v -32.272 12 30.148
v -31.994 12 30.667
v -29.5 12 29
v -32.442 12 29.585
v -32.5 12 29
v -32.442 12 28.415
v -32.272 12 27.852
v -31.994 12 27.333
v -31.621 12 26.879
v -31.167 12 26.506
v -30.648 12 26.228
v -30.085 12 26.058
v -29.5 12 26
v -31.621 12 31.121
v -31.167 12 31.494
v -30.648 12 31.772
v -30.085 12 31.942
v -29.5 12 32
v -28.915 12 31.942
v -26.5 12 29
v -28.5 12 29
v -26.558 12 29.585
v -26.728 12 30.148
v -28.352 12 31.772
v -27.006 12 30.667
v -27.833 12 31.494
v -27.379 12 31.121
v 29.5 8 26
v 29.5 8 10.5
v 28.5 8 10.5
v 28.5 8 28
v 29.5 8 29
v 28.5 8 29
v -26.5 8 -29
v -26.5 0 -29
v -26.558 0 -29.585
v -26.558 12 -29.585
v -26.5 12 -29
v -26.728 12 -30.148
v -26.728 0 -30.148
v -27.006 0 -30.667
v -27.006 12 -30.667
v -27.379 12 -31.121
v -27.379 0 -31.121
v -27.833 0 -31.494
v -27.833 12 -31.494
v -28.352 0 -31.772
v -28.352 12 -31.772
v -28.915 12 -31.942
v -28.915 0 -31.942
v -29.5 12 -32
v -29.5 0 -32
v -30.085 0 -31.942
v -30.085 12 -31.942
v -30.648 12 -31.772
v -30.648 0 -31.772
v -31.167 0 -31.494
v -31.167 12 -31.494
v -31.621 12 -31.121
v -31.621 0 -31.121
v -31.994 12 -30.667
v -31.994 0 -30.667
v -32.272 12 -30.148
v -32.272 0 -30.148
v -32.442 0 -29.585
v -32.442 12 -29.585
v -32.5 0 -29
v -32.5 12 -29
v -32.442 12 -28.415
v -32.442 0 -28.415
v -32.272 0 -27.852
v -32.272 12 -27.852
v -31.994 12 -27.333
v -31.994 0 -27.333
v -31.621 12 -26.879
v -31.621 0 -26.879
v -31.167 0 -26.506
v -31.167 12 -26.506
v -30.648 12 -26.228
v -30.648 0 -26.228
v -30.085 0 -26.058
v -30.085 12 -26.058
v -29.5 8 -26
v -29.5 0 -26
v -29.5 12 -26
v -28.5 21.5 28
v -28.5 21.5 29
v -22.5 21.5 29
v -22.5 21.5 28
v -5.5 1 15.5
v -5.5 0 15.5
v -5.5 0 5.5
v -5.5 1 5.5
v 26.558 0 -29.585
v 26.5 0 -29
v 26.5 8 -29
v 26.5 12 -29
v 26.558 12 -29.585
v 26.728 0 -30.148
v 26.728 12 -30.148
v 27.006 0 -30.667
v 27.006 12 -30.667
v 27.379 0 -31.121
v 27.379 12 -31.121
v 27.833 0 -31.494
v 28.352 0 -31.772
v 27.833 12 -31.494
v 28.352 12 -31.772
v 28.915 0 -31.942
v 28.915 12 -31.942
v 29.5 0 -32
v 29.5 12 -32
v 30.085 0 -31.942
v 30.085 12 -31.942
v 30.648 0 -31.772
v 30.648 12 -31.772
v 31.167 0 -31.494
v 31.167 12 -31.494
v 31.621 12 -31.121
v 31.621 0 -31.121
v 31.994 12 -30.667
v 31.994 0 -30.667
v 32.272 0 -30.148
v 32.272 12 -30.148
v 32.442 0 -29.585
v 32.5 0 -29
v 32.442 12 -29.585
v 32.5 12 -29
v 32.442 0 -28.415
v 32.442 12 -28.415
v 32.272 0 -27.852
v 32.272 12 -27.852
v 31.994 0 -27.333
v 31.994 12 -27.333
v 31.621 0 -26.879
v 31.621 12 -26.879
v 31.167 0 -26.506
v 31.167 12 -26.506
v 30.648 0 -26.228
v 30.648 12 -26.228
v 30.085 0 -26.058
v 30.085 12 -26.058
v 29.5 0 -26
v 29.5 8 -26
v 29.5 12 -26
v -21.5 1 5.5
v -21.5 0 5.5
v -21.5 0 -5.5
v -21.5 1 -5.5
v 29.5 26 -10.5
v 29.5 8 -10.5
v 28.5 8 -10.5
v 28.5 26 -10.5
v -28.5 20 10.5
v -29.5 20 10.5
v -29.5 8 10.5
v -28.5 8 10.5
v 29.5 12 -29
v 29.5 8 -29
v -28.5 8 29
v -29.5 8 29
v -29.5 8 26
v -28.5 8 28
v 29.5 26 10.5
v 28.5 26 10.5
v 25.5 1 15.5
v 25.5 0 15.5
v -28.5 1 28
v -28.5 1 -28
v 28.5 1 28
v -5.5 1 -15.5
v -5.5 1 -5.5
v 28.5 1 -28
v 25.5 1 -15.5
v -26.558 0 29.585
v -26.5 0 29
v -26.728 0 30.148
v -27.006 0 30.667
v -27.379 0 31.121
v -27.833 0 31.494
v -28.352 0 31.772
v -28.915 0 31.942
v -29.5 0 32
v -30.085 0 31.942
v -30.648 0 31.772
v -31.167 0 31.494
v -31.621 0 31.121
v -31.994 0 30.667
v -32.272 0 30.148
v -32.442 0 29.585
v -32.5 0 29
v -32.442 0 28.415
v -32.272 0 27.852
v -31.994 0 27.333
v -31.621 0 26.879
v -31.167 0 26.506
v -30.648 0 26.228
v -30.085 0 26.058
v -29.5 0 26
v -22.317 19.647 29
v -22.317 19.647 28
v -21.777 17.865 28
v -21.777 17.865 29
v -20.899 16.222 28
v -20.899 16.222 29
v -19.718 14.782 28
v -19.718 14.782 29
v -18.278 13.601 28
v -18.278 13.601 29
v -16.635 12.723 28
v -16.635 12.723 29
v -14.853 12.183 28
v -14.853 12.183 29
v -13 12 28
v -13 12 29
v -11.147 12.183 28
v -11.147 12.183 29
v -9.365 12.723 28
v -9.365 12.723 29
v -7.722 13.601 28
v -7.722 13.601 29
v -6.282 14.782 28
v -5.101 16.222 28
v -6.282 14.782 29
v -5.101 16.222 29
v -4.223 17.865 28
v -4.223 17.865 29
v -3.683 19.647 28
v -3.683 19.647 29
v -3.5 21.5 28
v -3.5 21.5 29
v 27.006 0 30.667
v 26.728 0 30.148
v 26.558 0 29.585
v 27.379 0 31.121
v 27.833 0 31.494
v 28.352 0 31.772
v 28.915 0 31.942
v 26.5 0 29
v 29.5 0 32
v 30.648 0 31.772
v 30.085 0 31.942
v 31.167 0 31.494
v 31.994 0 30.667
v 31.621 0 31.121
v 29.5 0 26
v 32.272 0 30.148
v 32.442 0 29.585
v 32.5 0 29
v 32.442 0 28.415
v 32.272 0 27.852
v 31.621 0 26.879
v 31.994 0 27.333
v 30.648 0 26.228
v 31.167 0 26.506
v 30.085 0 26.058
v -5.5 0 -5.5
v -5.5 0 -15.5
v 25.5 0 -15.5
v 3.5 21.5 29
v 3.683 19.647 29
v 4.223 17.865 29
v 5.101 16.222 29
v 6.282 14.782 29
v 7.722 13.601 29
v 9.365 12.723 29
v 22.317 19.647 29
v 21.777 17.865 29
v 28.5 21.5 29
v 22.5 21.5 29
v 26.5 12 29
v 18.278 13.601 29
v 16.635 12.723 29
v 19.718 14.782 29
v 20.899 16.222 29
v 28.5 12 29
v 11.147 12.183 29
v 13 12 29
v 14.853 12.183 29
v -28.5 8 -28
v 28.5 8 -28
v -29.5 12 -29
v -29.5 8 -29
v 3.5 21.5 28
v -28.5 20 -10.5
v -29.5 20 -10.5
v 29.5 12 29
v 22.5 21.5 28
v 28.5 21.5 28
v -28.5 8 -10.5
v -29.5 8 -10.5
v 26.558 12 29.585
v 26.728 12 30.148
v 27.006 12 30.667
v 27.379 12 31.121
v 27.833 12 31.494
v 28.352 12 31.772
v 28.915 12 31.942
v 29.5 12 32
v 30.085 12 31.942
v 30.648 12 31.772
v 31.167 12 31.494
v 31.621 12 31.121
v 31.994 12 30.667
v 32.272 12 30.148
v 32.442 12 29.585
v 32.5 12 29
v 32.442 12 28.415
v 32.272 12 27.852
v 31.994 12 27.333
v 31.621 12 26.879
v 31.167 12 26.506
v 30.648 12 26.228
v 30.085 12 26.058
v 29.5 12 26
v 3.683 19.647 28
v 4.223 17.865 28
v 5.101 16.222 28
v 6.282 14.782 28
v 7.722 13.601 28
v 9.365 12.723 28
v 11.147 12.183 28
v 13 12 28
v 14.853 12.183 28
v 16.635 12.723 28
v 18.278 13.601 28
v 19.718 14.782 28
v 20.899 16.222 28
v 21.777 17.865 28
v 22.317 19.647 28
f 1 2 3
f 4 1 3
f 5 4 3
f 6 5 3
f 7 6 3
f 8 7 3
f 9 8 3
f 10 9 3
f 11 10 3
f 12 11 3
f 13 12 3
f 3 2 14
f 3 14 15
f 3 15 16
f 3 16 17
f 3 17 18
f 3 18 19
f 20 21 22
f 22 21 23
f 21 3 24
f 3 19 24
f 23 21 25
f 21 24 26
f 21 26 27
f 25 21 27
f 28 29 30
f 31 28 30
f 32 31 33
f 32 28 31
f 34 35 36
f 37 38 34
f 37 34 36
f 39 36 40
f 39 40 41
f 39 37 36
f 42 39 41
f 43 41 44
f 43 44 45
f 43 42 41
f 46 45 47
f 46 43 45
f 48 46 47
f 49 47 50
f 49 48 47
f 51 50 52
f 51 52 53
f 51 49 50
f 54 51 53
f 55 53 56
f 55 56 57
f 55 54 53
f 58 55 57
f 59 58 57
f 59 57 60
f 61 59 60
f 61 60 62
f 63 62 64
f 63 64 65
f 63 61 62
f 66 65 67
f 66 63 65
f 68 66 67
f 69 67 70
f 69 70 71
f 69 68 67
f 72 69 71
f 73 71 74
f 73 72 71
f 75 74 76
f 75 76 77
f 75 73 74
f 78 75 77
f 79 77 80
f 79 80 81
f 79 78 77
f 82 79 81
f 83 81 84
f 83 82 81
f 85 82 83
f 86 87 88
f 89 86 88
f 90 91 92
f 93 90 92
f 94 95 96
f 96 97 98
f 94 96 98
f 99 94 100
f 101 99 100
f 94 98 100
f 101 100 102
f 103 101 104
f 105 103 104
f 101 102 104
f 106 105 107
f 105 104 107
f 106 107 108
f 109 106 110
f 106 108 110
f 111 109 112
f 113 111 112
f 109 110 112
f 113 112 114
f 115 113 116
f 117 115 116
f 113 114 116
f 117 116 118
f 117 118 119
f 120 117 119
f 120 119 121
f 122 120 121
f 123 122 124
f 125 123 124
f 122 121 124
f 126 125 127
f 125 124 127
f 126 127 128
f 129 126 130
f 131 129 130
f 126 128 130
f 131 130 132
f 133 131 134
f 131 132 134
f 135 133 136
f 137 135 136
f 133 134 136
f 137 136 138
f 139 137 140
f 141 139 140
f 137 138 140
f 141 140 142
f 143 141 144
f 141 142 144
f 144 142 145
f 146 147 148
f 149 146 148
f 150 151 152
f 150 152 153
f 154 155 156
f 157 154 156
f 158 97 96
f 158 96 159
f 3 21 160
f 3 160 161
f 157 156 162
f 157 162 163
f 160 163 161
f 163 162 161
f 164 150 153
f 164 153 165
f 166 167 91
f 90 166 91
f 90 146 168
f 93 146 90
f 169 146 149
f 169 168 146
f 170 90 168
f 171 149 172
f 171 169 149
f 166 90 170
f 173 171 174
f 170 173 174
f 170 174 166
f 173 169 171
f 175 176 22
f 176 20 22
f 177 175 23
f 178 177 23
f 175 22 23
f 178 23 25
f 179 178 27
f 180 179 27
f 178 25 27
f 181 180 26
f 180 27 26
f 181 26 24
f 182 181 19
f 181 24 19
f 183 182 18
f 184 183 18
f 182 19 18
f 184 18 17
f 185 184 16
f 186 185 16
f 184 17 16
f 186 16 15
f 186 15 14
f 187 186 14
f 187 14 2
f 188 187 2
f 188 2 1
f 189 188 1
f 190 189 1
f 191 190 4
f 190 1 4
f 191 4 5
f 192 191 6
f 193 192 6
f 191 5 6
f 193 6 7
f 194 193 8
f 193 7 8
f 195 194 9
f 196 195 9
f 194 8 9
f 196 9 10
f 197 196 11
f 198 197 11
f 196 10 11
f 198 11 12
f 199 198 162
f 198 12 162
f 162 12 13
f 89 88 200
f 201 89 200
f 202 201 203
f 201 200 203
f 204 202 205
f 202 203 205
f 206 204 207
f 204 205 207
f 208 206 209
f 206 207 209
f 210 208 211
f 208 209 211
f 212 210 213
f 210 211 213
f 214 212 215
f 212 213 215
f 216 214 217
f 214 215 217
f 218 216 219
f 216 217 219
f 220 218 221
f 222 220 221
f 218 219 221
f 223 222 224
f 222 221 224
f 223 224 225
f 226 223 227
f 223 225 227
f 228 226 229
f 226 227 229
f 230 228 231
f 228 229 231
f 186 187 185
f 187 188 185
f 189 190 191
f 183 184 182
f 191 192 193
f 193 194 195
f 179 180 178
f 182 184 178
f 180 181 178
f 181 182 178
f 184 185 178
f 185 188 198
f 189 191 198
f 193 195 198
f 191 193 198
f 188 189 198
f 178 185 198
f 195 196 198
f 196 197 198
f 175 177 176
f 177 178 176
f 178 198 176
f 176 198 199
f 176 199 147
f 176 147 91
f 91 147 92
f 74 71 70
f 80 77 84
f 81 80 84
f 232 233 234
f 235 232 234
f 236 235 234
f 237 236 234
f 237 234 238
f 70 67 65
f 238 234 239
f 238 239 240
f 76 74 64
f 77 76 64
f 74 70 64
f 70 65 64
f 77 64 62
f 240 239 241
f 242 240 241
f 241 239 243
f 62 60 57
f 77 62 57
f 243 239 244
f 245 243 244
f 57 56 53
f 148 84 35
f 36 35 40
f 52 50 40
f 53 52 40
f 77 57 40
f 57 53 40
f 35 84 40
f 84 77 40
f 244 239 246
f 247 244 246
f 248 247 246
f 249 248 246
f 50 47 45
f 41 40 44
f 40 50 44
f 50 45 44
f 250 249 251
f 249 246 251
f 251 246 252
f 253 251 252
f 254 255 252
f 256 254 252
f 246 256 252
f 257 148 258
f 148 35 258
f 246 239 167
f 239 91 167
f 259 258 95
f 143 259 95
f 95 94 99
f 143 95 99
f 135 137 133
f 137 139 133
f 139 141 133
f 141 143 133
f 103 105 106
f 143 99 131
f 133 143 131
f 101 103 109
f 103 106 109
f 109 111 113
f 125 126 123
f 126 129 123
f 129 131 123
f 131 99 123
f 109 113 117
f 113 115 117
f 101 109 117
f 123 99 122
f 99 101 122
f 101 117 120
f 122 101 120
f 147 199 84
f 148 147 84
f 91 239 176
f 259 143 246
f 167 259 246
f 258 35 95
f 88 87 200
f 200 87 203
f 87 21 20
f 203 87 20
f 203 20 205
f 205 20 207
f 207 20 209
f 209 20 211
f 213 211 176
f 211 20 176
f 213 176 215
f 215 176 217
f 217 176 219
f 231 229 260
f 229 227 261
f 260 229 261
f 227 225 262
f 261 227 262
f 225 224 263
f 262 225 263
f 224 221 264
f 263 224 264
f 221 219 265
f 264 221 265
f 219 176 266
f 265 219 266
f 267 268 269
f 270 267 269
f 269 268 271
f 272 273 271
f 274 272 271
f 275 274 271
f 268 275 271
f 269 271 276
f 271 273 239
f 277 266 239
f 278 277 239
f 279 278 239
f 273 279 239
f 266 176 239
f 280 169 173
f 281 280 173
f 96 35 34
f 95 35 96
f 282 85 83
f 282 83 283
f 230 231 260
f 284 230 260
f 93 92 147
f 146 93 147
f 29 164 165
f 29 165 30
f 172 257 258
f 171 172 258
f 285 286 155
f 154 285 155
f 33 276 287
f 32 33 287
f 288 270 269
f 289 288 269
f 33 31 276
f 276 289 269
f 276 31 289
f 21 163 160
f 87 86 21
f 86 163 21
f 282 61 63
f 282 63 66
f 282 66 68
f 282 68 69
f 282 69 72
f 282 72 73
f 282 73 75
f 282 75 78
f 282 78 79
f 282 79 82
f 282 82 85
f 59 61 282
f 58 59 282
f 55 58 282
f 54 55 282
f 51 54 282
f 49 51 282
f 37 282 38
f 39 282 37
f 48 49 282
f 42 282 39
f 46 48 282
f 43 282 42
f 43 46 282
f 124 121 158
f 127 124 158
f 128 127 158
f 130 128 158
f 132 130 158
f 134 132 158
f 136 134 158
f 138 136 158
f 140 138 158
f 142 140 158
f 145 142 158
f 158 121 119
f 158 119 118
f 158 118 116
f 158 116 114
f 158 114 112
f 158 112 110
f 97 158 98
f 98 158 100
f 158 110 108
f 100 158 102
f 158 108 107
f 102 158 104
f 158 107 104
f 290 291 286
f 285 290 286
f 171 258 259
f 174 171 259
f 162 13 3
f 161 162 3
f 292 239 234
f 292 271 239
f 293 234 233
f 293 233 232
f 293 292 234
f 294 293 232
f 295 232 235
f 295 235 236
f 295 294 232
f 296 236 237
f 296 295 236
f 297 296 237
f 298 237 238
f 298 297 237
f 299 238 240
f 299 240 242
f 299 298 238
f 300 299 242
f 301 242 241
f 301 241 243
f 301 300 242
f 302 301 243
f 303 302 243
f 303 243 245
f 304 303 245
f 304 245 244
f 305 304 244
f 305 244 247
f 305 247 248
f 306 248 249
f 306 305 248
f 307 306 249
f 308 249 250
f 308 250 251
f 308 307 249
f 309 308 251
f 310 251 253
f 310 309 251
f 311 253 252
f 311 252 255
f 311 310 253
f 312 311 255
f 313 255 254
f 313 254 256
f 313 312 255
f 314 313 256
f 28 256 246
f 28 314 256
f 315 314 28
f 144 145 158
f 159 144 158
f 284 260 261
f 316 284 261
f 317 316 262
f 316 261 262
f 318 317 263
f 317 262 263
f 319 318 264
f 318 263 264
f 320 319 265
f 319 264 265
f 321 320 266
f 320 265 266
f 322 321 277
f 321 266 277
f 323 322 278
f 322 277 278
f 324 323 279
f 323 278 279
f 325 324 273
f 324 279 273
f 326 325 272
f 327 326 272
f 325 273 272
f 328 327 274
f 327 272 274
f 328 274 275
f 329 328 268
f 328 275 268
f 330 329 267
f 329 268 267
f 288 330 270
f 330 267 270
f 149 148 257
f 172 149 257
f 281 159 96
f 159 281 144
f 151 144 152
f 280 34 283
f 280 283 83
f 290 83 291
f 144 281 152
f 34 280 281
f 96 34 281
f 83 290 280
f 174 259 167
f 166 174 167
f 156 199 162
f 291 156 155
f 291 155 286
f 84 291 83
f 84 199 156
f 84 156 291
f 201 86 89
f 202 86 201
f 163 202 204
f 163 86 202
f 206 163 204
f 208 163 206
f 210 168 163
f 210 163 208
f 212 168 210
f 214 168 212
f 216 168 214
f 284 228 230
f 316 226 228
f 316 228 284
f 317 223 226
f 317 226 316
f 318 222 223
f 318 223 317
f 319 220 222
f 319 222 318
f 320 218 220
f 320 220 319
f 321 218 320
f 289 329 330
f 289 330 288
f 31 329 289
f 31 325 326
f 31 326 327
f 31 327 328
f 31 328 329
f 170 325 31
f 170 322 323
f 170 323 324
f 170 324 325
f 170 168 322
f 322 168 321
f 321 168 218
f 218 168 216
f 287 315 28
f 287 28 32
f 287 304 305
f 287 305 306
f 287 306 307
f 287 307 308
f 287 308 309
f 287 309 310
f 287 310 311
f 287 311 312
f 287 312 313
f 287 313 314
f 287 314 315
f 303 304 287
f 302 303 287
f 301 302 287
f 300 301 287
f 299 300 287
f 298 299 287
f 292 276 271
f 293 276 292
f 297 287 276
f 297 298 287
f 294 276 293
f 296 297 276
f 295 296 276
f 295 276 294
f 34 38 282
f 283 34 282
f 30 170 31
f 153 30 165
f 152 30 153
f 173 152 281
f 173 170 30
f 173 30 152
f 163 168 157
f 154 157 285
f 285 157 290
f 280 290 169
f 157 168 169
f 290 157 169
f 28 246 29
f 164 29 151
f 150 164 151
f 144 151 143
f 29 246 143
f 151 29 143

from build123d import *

# Parameters (mm, degrees)
SKETCH1_W               = 59
SKETCH1_H               = 58
BOSS_EXTRUDE1_DEPTH     = 1
SKETCH2_W               = 59
SKETCH2_H               = 58
SKETCH2_W_2             = 57
SKETCH2_H_2             = 56
BOSS_EXTRUDE2_DEPTH     = 33
CUT_EXTRUDE1_DEPTH      = 1
CUT_EXTRUDE2_DEPTH      = 1
CUT_EXTRUDE3_DEPTH      = 1
SKETCH8_R               = 9.5
CUT_EXTRUDE4_DEPTH      = 1
SKETCH9_W               = 57
SKETCH9_H               = 26
CUT_EXTRUDE5_DEPTH      = 1
SKETCH11_W              = 3
SKETCH11_H              = 12
REVOLVE2_ANGLE          = 270
MIRROR2_COPY_1_SKETCH_W = 3
MIRROR2_COPY_1_SKETCH_H = 12
MIRROR2_COPY_1_ANGLE    = 270


with BuildPart() as part:
    # Sketch1 → Boss-Extrude1 (new body)
    with BuildSketch(Plane(origin=(0, 0, 0), x_dir=(1, 0, 0), z_dir=(0, 1, 0))):
        Rectangle(SKETCH1_W, SKETCH1_H)
    extrude(amount=BOSS_EXTRUDE1_DEPTH)

    # Sketch2 → Boss-Extrude2 (add)
    with BuildSketch(Plane(origin=(0, 1, 0), x_dir=(1, 0, 0), z_dir=(0, 1, 0))):
        Rectangle(SKETCH2_W, SKETCH2_H)
        Rectangle(SKETCH2_W_2, SKETCH2_H_2, mode=Mode.SUBTRACT)
    extrude(amount=BOSS_EXTRUDE2_DEPTH)

    # Sketch3 → Cut-Extrude1 (cut)
    with BuildSketch(Plane.ZY.offset(29.5)):
        Polygon((10.5, 8), (29, 8), (29, 34), (-29, 34), (-29, 8), (-10.5, 8), (-10.5, 20), (10.5, 20), align=None)
    extrude(amount=-CUT_EXTRUDE1_DEPTH, mode=Mode.SUBTRACT)

    # Sketch5 → Cut-Extrude2 (cut)
    with BuildSketch(Plane.XZ):
        Polygon((-21.5, 5.5), (-21.5, -5.5), (-5.5, -5.5), (-5.5, -15.5), (25.5, -15.5), (25.5, 15.5), (-5.5, 15.5), (-5.5, 5.5), align=None)
    extrude(amount=-CUT_EXTRUDE2_DEPTH, mode=Mode.SUBTRACT)

    # Sketch7 → Cut-Extrude3 (cut)
    with BuildSketch(Plane(origin=(29.5, 0, 0), x_dir=(0, 0, -1), z_dir=(1, 0, 0))):
        Polygon((29, 8), (10.5, 8), (10.5, 26), (-10.5, 26), (-10.5, 8), (-29, 8), (-29, 34), (29, 34), align=None)
    extrude(amount=-CUT_EXTRUDE3_DEPTH, mode=Mode.SUBTRACT)

    # Sketch8 → Cut-Extrude4 (cut)
    with BuildSketch(Plane.XY.offset(29)):
        with BuildLine():
            Line((22.5, 21.5), (28.5, 21.5))
            Line((28.5, 21.5), (28.5, 34))
            Line((28.5, 34), (-28.5, 34))
            Line((-28.5, 34), (-28.5, 21.5))
            Line((-28.5, 21.5), (-22.5, 21.5))
            ThreePointArc((-22.5, 21.5), (-13, 31), (-3.5, 21.5))
            Line((-3.5, 21.5), (3.5, 21.5))
            ThreePointArc((3.5, 21.5), (13, 31), (22.5, 21.5))
        make_face()
        with Locations((-13, 21.5)):
            Circle(SKETCH8_R)
        with Locations((13, 21.5)):
            Circle(SKETCH8_R)
    extrude(amount=-CUT_EXTRUDE4_DEPTH, mode=Mode.SUBTRACT)

    # Sketch9 → Cut-Extrude5 (cut)
    with BuildSketch(Plane(origin=(0, 0, -29), x_dir=(-1, 0, 0), z_dir=(0, 0, -1))):
        with Locations((0, 21)):
            Rectangle(SKETCH9_W, SKETCH9_H)
    extrude(amount=-CUT_EXTRUDE5_DEPTH, mode=Mode.SUBTRACT)

    # Sketch11 → Revolve2 (revolve)
    with BuildSketch(Plane.XY.offset(29)):
        with Locations((28, 6)):
            Rectangle(SKETCH11_W, SKETCH11_H)
    revolve2 = revolve(axis=Axis((29.5, 0, 29), (0, 1, 0)), revolution_arc=REVOLVE2_ANGLE)

    # Mirror1: Revolve2 across plane
    add(revolve2.mirror(Plane.XY))

    # Mirror2: Revolve2 across plane
    add(revolve2.mirror(Plane(origin=(0, 0, 0), x_dir=(0, 0, 1), z_dir=(1, 0, 0))))

    # Mirror2 copy 1 sketch → Mirror2 copy 1 (revolve)
    with BuildSketch(Plane(origin=(0, 0, -29), x_dir=(-1, 0, 0), z_dir=(0, 0, -1))):
        with Locations((28, 6)):
            Rectangle(MIRROR2_COPY_1_SKETCH_W, MIRROR2_COPY_1_SKETCH_H)
    revolve(axis=Axis((-29.5, 0, -29), (0, 1, 0)), revolution_arc=MIRROR2_COPY_1_ANGLE)


solid = part.part
